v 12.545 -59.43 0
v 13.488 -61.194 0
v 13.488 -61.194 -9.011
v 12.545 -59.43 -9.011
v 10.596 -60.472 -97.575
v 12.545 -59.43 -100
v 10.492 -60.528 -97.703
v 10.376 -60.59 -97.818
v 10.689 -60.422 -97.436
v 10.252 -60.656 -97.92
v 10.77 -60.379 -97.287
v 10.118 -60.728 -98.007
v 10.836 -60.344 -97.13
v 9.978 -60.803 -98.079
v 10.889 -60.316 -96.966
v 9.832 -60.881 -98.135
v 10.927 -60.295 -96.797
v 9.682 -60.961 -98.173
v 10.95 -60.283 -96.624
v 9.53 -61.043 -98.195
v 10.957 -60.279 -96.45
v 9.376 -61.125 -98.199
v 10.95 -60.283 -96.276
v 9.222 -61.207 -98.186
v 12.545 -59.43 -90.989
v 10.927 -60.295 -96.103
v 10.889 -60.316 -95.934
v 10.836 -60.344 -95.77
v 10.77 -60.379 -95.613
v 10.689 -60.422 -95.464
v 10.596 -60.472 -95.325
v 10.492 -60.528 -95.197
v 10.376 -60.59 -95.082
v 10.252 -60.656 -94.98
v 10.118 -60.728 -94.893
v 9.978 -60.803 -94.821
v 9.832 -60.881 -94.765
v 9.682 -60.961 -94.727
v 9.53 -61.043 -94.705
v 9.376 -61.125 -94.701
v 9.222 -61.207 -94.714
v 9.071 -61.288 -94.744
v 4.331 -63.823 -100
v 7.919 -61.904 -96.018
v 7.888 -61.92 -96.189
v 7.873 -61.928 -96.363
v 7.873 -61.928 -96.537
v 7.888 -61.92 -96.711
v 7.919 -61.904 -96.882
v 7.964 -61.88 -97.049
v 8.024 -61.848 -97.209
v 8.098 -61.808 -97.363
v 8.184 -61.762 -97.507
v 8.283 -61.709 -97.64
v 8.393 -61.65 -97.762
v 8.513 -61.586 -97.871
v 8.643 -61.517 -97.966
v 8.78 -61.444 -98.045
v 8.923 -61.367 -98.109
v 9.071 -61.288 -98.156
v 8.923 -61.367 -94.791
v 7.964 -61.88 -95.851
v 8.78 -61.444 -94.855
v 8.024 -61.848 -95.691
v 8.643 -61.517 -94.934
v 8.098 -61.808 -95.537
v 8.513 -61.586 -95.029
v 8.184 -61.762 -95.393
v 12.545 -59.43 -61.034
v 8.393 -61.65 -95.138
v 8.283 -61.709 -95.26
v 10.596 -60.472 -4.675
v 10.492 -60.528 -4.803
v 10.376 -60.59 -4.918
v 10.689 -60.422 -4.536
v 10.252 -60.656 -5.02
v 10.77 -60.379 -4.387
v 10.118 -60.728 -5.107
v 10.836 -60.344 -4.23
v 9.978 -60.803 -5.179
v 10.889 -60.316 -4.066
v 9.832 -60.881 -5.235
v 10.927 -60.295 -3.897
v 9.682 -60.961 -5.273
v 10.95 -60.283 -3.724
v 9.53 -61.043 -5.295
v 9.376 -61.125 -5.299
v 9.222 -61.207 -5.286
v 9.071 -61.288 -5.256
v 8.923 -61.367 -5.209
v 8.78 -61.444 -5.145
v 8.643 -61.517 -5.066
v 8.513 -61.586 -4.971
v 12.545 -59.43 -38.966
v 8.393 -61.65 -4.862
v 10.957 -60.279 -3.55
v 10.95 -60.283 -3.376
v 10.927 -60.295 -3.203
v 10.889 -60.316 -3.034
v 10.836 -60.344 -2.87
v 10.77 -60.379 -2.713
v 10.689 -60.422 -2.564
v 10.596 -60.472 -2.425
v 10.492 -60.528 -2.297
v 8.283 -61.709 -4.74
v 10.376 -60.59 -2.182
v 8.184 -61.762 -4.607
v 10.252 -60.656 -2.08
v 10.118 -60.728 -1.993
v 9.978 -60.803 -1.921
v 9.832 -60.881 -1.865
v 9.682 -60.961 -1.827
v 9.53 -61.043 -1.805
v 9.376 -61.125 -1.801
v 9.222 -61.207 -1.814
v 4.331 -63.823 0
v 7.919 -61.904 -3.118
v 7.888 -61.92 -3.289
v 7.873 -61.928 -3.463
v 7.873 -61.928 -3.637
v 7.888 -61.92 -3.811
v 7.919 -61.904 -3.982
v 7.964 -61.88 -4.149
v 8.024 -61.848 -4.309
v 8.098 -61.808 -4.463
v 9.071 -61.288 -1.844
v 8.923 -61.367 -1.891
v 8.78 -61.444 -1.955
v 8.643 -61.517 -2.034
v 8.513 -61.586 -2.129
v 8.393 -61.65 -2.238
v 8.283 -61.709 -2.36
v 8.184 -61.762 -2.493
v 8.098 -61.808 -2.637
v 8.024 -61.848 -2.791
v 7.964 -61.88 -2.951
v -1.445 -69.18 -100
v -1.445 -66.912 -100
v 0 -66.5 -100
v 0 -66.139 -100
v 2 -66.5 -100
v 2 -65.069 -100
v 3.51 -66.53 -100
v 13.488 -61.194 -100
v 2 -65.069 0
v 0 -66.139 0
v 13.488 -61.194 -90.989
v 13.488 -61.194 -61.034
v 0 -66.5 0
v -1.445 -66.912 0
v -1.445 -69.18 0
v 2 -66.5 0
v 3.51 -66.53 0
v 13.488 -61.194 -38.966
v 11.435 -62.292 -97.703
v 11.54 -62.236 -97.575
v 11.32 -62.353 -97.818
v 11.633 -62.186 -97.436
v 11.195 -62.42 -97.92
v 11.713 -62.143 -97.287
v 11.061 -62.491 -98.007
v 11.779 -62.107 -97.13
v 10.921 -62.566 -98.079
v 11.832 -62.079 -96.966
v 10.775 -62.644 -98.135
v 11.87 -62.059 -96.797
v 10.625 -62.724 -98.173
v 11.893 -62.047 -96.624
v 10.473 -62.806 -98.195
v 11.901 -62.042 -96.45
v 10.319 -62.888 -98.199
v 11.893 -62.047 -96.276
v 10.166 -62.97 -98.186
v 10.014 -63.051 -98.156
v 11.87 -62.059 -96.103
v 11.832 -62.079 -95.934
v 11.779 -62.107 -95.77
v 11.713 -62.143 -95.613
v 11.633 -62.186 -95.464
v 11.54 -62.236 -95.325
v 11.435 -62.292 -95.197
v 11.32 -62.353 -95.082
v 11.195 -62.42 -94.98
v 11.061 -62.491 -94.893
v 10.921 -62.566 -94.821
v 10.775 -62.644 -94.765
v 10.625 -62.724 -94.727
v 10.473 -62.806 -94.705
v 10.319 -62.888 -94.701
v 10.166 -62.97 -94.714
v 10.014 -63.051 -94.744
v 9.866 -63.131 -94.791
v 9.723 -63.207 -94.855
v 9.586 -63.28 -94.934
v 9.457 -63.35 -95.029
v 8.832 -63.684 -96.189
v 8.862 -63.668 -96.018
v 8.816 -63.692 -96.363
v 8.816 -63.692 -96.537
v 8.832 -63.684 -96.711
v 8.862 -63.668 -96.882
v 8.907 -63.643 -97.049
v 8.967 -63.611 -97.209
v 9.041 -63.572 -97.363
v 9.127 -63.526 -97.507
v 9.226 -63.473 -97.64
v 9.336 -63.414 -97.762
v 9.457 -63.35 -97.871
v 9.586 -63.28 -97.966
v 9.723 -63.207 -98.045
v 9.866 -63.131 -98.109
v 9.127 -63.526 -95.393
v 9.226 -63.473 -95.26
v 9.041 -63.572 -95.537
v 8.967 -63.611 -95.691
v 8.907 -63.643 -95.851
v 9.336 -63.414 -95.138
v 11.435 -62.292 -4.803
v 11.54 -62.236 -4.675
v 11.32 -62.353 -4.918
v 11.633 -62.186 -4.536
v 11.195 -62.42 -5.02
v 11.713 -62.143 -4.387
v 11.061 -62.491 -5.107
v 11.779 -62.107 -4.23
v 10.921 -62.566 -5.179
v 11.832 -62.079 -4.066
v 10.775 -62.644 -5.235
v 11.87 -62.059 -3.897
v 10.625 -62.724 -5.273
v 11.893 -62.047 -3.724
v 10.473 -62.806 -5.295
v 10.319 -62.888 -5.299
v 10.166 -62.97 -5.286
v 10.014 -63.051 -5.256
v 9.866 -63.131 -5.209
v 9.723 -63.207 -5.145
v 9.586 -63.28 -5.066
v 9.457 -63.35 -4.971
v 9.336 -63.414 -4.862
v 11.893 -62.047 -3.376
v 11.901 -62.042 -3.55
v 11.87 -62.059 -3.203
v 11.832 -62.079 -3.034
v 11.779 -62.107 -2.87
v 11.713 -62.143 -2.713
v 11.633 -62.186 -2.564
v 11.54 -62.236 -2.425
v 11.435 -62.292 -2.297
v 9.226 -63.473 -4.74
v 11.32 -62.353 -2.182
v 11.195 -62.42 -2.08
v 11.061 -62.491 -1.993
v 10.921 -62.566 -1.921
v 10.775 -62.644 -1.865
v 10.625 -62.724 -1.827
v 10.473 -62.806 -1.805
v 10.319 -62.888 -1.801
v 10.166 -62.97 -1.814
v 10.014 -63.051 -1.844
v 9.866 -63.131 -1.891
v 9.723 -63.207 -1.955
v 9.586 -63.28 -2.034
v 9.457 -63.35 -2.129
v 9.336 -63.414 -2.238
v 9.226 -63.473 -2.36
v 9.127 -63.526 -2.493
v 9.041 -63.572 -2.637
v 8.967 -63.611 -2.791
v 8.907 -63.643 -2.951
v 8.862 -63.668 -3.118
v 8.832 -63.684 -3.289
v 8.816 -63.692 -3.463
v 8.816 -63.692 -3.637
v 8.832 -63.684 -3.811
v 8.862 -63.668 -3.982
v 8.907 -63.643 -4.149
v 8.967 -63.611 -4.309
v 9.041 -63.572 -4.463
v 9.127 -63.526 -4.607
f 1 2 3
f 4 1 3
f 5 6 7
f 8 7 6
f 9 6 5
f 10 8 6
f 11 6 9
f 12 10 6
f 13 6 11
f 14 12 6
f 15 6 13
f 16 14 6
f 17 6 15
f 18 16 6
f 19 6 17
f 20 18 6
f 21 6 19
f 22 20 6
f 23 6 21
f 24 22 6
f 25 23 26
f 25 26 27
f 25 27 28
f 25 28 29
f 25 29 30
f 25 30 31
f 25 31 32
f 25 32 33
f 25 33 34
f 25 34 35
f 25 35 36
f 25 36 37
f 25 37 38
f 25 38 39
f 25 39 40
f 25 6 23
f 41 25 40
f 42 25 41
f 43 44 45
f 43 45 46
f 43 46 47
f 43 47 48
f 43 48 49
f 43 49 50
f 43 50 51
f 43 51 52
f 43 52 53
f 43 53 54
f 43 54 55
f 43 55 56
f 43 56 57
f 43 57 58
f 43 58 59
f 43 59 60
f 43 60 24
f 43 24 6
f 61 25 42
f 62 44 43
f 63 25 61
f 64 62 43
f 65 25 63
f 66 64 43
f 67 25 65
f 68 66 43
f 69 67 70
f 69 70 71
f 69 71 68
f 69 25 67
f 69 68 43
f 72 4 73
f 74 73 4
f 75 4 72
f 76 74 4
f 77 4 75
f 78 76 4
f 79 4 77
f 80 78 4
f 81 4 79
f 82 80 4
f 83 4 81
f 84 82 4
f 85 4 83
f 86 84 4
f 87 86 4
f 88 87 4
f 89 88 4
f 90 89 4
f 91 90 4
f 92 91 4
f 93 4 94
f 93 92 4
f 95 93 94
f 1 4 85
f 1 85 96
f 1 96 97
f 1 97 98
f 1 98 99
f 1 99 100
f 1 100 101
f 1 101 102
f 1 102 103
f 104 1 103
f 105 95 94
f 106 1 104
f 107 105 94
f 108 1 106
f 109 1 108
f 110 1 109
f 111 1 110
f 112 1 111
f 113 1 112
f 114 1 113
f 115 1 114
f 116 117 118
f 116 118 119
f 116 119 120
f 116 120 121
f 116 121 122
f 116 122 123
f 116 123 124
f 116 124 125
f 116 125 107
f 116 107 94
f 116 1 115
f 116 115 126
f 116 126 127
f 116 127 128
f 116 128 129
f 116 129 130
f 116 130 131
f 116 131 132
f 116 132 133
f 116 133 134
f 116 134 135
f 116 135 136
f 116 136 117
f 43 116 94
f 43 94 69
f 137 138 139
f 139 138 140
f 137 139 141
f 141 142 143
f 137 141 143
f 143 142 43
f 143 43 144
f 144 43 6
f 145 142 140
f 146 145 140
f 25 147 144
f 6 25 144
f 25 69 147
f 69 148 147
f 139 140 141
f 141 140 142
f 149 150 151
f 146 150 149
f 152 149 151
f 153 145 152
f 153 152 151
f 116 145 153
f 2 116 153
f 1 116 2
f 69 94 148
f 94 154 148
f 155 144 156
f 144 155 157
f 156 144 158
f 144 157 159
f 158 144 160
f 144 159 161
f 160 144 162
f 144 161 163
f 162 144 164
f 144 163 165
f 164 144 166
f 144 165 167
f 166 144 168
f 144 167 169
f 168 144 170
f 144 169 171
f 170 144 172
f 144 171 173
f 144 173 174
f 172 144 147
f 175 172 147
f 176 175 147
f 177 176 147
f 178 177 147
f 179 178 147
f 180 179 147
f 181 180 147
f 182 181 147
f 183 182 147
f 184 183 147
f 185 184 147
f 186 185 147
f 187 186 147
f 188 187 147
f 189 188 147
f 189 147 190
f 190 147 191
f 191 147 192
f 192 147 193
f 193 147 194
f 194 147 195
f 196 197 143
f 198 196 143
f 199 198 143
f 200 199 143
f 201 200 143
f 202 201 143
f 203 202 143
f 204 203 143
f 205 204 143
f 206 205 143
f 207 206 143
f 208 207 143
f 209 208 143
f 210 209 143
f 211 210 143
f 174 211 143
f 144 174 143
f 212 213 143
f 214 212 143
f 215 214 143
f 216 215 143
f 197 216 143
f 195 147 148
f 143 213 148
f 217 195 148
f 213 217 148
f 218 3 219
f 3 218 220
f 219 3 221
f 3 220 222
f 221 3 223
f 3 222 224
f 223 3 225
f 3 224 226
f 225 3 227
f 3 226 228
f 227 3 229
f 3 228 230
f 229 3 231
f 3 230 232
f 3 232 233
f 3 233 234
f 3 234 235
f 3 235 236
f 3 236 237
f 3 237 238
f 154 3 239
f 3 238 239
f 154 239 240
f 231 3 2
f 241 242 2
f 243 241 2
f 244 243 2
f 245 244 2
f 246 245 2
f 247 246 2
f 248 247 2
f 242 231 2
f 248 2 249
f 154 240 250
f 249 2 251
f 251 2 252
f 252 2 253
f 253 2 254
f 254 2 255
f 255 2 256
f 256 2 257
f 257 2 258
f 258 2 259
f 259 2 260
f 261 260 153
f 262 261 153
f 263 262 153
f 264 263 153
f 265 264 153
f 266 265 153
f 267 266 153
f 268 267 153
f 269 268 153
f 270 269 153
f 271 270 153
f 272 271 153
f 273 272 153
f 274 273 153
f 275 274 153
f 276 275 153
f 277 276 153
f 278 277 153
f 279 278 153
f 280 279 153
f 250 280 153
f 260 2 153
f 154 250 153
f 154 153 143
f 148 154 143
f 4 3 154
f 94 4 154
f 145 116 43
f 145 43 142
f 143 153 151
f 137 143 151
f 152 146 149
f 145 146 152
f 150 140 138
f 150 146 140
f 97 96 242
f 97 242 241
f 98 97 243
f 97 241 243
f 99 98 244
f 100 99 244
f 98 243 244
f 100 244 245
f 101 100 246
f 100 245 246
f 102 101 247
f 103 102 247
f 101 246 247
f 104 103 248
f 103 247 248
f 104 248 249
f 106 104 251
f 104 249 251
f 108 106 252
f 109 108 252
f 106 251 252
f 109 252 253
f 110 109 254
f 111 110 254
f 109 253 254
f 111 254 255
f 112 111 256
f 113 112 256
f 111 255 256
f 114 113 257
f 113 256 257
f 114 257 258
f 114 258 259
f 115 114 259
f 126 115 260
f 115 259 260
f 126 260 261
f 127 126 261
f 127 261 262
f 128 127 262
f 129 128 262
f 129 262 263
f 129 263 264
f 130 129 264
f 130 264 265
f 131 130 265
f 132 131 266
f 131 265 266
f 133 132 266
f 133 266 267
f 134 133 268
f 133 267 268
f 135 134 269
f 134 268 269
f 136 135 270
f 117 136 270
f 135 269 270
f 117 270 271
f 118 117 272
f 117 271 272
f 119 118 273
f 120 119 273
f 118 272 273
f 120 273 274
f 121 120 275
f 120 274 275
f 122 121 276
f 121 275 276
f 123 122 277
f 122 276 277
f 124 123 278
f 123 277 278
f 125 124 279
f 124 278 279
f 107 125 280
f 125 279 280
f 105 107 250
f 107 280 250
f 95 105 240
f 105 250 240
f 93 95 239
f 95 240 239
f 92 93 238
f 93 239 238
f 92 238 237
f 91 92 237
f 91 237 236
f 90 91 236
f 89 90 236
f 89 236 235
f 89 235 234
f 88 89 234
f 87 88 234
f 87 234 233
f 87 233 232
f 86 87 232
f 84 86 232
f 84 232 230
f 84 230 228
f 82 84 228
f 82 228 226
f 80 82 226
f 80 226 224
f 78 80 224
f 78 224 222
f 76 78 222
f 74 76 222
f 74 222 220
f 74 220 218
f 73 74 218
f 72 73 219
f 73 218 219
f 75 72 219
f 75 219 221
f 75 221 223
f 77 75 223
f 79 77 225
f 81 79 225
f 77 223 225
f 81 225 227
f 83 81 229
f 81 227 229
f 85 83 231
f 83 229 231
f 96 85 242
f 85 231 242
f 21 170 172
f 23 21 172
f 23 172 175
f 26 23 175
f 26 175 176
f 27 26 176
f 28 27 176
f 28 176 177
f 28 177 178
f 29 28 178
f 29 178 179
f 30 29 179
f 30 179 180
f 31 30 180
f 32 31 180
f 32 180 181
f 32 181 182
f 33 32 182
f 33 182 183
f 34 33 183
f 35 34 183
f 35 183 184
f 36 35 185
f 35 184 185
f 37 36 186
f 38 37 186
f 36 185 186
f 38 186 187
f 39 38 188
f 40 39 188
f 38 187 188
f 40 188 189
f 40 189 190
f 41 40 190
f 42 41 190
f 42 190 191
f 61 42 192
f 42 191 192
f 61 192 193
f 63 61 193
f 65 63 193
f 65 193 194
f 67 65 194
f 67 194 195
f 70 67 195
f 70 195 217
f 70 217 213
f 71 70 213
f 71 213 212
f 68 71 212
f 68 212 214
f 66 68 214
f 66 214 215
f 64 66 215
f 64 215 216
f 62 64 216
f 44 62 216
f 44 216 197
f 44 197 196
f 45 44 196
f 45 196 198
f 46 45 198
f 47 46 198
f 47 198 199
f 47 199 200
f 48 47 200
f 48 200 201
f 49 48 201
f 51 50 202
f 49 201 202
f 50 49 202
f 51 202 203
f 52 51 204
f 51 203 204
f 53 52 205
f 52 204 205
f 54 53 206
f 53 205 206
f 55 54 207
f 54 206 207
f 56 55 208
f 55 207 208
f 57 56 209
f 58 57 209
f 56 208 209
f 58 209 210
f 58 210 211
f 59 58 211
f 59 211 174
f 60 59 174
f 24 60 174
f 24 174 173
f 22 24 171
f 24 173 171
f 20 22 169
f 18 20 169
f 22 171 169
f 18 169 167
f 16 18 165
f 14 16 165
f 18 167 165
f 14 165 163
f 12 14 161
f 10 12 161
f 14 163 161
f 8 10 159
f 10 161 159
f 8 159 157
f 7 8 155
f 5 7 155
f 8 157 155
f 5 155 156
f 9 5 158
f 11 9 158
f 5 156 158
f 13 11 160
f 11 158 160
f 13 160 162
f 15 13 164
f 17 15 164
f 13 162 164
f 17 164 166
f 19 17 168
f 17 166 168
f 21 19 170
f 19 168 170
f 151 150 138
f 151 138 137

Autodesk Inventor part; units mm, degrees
ref_plane "YZ Plane" through (0, 0, 0) normal (1, 0, 0) x (0, 1, 0)
ref_plane "XZ Plane" through (0, 0, 0) normal (0, 1, 0) x (-1, 0, 0)
ref_plane "XY Plane" through (0, 0, 0) normal (0, 0, 1) x (1, 0, 0)
sketch "Szkic1" plane through (0, 0, 0) normal (0, 0, 1) x (1, 0, 0)
  line L0 (0, 0) -> (0, -66.5) projected
  line L1 (0, -66.5) -> (2, -66.5) projected
  line L2 (2, 0) -> (2, -66.5) projected
  line L3 (0, 0) -> (2, 0) projected
  circle A0 centre (7, 15.8) radius 1.5 projected
  circle A1 centre (7, 15.8) radius 15.02 projected
  line L4 (7, 30.82) -> (7, 14.3)
  line L5 (7, -69.18) -> (-7.0129, -69.18)
  line L6 (37, -46.3508) -> (4.3309, -63.8229) projected
  line L7 (37, -48.6189) -> (3.5105, -66.5297) projected
  line L8 (37, -48.6189) -> (37, -46.3508)
  line L9 (37, -48.6189) -> (-1.4451, -69.18)
  line L10 (37, -46.3508) -> (-1.4451, -66.9119)
  line L11 (-1.4451, -66.9119) -> (-1.4451, -69.18)
  dimension "d0" = 100
extrude "Wyciągnięcie proste1" add sketch "Szkic1" against normal blind 100 contours L10 L2 L1 L0 | L0 L1 L2 L10 L6 L8 L7 L9 L11
sketch "Szkic5" plane through (-1.4451, -69.18, -100) normal (0.4716, -0.8818, 0) x (0.8818, 0.4716, 0)
  line L0 (17.9345, 9.0111) -> (17.7164, 38.6148) projected
  line L1 (17.7164, 38.6148) -> (26.2335, 38.9662) projected
  line L2 (26.4517, 9.3625) -> (17.9345, 9.0111) projected
  line L3 (26.2335, 38.9662) -> (17.9345, 38.9662)
  line L4 (17.9345, 38.9662) -> (17.9345, 9.0111)
  line L5 (17.9345, 9.0111) -> (26.2335, 9.0111)
  line L6 (26.2335, 9.0111) -> (26.2335, 38.9662)
  line L7 (17.4345, 39.4662) -> (26.7335, 39.4662)
  line L8 (26.7335, 39.4662) -> (26.7335, 8.5111)
  line L9 (26.7335, 8.5111) -> (17.4345, 8.5111)
  line L10 (17.4345, 8.5111) -> (17.4345, 39.4662)
  line L11 (17.4345, 39.4662) -> (16.9345, 39.4662)
  line L12 (16.9345, 39.4662) -> (16.9345, 8.5111)
  line L13 (16.9345, 8.5111) -> (17.4345, 8.5111)
  line L14 (17.4345, 8.5111) -> (17.4345, 39.4662)
  line L15 (26.7335, 38.9662) -> (16.9345, 38.9662)
  line L16 (16.9345, 38.9662) -> (16.9345, 9.0111)
  line L17 (16.9345, 9.0111) -> (26.7335, 9.0111)
  line L18 (26.7335, 9.0111) -> (26.7335, 38.9662)
  point P0 (33.9001, 100)
  point P1 (17.9345, 9.0111)
  point P2 (26.7335, 9.0111)
  point P3 (17.9345, 38.9662)
  dimension "d7" = 0.5
  dimension "d8" = 0.5
extrude "Wyciągnięcie proste4" cut sketch "Szkic5" against normal through all contours L17 L10 L15 L4 L1 L0 | L4 L1 L6 L2 | L0 L1 L4 | L2 L6 L5 | L6 L15 L8 L17 | L4 L3 L1 | L17 L12 L15 L10
ref_plane "Płaszczyzna konstrukcyjna1" through (0, 0, -50) normal (0, 0, 1) x (1, 0, 0)
mirror "Odbij1" about plane through (0, 0, -50) normal (0, 0, 1) of "Wyciągnięcie proste4"
sketch "Szkic6" plane through (-1.4451, -69.18, -100) normal (0.4716, -0.8818, 0) x (0.8818, 0.4716, 0)
  line L0 (16.9345, 61.0338) -> (16.9345, 38.9662) projected
  line L1 (44.6676, 100) -> (16.9345, 100) projected
  line L2 (44.6676, 100) -> (44.6676, 0) projected
  line L3 (16.9345, 0) -> (44.6676, 0) projected
  line L4 (16.9345, 9.0111) -> (26.7335, 9.0111) projected
  line L5 (26.7335, 9.0111) -> (26.7335, 38.9662) projected
  line L6 (26.7335, 38.9662) -> (16.9345, 38.9662) projected
  line L7 (16.9345, 61.0338) -> (26.7335, 61.0338) projected
  line L8 (26.7335, 61.0338) -> (26.7335, 90.9889) projected
  line L9 (26.7335, 90.9889) -> (16.9345, 90.9889) projected
  circle A0 centre (32.598, 3.55) radius 1.75 projected
  circle A1 centre (32.598, 96.45) radius 1.75 projected
  line L10 (16.9345, 90.9889) -> (16.9345, 100) projected
  line L11 (16.9345, 0) -> (16.9345, 9.0111) projected
  line L12 (16.9345, 38.9662) -> (16.9345, 61.0338) projected
  point P0 (33.9001, 100)
extrude "Wyciągnięcie proste5" [suppressed]
sketch "Szkic7" plane through (-1.4451, -69.18, -100) normal (0.4716, -0.8818, 0) x (0.8818, 0.4716, 0)
  line L0 (0, 100) -> (43.598, 100) projected
  line L1 (0, 100) -> (0, 0) projected
  line L2 (43.598, 0) -> (0, 0) projected
  line L3 (16.9345, 100) -> (0, 100)
  line L4 (0, 100) -> (0, 92.9)
  line L5 (0, 92.9) -> (16.9345, 92.9)
  line L6 (16.9345, 92.9) -> (16.9345, 100)
  circle A0 centre (13.3845, 96.45) radius 3.55
  circle A1 centre (13.3845, 96.45) radius 1.75
  line L7 (-8.9335, 50) -> (53.6011, 50) projected
  circle A2 centre (13.3845, 3.55) radius 1.75
  line L8 (43.598, 100) -> (43.598, 0) projected
  point P0 (33.9001, 100)
  dimension "d13" = 7.1
  dimension "d14" = 3.5
extrude "Wyciągnięcie proste6" cut sketch "Szkic7" against normal through all contours A1 | A2
sketch "Szkic8" plane through (-1.4451, -69.18, -100) normal (0.4716, -0.8818, 0) x (0.8818, 0.4716, 0)
  circle A0 centre (13.3845, 3.55) radius 1.75 projected
  circle A1 centre (13.3845, 96.45) radius 1.75 projected
  line L0 (16.9345, 61.0338) -> (16.9345, 90.9889) projected
  line L1 (16.9345, 90.9889) -> (26.7335, 90.9889) projected
  line L2 (26.7335, 90.9889) -> (26.7335, 61.0338) projected
  line L3 (26.7335, 61.0338) -> (16.9345, 61.0338) projected
  line L4 (26.7335, 38.9662) -> (26.7335, 9.0111) projected
  line L5 (26.7335, 9.0111) -> (16.9345, 9.0111) projected
  line L6 (16.9345, 9.0111) -> (16.9345, 38.9662) projected
  line L7 (16.9345, 38.9662) -> (26.7335, 38.9662) projected
  line L8 (0, 100) -> (43.598, 100) projected
  line L9 (0, 100) -> (0, 0) projected
  line L10 (43.598, 0) -> (0, 0) projected
  line L11 (43.598, 100) -> (43.598, 0) projected
  line L12 (43.598, 100) -> (44.6676, 100) projected
  line L13 (43.598, 100) -> (43.598, 0) projected
  line L14 (44.6676, 0) -> (43.598, 0) projected
  line L15 (44.6676, 100) -> (44.6676, 0) projected
  line L16 (44.6676, 100) -> (16.9345, 100)
  line L17 (16.9345, 100) -> (16.9345, 0)
  line L18 (16.9345, 0) -> (44.6676, 0)
  line L19 (44.6676, 0) -> (44.6676, 100)
  point P0 (33.9001, 100)
  point P1 (16.9345, 61.0338)
  point P2 (16.9345, 38.9662)
  point P3 (16.9345, 9.0111)
  point P4 (16.9345, 100)
  point P5 (16.9345, 90.9889)
extrude "Wyciągnięcie proste7" cut sketch "Szkic8" against normal through all contours L3 L2 L1 L17 L8 L11 L10 L5 L4 L7 | L12 L15 L14 L11
properties part number "plug_kopia"
